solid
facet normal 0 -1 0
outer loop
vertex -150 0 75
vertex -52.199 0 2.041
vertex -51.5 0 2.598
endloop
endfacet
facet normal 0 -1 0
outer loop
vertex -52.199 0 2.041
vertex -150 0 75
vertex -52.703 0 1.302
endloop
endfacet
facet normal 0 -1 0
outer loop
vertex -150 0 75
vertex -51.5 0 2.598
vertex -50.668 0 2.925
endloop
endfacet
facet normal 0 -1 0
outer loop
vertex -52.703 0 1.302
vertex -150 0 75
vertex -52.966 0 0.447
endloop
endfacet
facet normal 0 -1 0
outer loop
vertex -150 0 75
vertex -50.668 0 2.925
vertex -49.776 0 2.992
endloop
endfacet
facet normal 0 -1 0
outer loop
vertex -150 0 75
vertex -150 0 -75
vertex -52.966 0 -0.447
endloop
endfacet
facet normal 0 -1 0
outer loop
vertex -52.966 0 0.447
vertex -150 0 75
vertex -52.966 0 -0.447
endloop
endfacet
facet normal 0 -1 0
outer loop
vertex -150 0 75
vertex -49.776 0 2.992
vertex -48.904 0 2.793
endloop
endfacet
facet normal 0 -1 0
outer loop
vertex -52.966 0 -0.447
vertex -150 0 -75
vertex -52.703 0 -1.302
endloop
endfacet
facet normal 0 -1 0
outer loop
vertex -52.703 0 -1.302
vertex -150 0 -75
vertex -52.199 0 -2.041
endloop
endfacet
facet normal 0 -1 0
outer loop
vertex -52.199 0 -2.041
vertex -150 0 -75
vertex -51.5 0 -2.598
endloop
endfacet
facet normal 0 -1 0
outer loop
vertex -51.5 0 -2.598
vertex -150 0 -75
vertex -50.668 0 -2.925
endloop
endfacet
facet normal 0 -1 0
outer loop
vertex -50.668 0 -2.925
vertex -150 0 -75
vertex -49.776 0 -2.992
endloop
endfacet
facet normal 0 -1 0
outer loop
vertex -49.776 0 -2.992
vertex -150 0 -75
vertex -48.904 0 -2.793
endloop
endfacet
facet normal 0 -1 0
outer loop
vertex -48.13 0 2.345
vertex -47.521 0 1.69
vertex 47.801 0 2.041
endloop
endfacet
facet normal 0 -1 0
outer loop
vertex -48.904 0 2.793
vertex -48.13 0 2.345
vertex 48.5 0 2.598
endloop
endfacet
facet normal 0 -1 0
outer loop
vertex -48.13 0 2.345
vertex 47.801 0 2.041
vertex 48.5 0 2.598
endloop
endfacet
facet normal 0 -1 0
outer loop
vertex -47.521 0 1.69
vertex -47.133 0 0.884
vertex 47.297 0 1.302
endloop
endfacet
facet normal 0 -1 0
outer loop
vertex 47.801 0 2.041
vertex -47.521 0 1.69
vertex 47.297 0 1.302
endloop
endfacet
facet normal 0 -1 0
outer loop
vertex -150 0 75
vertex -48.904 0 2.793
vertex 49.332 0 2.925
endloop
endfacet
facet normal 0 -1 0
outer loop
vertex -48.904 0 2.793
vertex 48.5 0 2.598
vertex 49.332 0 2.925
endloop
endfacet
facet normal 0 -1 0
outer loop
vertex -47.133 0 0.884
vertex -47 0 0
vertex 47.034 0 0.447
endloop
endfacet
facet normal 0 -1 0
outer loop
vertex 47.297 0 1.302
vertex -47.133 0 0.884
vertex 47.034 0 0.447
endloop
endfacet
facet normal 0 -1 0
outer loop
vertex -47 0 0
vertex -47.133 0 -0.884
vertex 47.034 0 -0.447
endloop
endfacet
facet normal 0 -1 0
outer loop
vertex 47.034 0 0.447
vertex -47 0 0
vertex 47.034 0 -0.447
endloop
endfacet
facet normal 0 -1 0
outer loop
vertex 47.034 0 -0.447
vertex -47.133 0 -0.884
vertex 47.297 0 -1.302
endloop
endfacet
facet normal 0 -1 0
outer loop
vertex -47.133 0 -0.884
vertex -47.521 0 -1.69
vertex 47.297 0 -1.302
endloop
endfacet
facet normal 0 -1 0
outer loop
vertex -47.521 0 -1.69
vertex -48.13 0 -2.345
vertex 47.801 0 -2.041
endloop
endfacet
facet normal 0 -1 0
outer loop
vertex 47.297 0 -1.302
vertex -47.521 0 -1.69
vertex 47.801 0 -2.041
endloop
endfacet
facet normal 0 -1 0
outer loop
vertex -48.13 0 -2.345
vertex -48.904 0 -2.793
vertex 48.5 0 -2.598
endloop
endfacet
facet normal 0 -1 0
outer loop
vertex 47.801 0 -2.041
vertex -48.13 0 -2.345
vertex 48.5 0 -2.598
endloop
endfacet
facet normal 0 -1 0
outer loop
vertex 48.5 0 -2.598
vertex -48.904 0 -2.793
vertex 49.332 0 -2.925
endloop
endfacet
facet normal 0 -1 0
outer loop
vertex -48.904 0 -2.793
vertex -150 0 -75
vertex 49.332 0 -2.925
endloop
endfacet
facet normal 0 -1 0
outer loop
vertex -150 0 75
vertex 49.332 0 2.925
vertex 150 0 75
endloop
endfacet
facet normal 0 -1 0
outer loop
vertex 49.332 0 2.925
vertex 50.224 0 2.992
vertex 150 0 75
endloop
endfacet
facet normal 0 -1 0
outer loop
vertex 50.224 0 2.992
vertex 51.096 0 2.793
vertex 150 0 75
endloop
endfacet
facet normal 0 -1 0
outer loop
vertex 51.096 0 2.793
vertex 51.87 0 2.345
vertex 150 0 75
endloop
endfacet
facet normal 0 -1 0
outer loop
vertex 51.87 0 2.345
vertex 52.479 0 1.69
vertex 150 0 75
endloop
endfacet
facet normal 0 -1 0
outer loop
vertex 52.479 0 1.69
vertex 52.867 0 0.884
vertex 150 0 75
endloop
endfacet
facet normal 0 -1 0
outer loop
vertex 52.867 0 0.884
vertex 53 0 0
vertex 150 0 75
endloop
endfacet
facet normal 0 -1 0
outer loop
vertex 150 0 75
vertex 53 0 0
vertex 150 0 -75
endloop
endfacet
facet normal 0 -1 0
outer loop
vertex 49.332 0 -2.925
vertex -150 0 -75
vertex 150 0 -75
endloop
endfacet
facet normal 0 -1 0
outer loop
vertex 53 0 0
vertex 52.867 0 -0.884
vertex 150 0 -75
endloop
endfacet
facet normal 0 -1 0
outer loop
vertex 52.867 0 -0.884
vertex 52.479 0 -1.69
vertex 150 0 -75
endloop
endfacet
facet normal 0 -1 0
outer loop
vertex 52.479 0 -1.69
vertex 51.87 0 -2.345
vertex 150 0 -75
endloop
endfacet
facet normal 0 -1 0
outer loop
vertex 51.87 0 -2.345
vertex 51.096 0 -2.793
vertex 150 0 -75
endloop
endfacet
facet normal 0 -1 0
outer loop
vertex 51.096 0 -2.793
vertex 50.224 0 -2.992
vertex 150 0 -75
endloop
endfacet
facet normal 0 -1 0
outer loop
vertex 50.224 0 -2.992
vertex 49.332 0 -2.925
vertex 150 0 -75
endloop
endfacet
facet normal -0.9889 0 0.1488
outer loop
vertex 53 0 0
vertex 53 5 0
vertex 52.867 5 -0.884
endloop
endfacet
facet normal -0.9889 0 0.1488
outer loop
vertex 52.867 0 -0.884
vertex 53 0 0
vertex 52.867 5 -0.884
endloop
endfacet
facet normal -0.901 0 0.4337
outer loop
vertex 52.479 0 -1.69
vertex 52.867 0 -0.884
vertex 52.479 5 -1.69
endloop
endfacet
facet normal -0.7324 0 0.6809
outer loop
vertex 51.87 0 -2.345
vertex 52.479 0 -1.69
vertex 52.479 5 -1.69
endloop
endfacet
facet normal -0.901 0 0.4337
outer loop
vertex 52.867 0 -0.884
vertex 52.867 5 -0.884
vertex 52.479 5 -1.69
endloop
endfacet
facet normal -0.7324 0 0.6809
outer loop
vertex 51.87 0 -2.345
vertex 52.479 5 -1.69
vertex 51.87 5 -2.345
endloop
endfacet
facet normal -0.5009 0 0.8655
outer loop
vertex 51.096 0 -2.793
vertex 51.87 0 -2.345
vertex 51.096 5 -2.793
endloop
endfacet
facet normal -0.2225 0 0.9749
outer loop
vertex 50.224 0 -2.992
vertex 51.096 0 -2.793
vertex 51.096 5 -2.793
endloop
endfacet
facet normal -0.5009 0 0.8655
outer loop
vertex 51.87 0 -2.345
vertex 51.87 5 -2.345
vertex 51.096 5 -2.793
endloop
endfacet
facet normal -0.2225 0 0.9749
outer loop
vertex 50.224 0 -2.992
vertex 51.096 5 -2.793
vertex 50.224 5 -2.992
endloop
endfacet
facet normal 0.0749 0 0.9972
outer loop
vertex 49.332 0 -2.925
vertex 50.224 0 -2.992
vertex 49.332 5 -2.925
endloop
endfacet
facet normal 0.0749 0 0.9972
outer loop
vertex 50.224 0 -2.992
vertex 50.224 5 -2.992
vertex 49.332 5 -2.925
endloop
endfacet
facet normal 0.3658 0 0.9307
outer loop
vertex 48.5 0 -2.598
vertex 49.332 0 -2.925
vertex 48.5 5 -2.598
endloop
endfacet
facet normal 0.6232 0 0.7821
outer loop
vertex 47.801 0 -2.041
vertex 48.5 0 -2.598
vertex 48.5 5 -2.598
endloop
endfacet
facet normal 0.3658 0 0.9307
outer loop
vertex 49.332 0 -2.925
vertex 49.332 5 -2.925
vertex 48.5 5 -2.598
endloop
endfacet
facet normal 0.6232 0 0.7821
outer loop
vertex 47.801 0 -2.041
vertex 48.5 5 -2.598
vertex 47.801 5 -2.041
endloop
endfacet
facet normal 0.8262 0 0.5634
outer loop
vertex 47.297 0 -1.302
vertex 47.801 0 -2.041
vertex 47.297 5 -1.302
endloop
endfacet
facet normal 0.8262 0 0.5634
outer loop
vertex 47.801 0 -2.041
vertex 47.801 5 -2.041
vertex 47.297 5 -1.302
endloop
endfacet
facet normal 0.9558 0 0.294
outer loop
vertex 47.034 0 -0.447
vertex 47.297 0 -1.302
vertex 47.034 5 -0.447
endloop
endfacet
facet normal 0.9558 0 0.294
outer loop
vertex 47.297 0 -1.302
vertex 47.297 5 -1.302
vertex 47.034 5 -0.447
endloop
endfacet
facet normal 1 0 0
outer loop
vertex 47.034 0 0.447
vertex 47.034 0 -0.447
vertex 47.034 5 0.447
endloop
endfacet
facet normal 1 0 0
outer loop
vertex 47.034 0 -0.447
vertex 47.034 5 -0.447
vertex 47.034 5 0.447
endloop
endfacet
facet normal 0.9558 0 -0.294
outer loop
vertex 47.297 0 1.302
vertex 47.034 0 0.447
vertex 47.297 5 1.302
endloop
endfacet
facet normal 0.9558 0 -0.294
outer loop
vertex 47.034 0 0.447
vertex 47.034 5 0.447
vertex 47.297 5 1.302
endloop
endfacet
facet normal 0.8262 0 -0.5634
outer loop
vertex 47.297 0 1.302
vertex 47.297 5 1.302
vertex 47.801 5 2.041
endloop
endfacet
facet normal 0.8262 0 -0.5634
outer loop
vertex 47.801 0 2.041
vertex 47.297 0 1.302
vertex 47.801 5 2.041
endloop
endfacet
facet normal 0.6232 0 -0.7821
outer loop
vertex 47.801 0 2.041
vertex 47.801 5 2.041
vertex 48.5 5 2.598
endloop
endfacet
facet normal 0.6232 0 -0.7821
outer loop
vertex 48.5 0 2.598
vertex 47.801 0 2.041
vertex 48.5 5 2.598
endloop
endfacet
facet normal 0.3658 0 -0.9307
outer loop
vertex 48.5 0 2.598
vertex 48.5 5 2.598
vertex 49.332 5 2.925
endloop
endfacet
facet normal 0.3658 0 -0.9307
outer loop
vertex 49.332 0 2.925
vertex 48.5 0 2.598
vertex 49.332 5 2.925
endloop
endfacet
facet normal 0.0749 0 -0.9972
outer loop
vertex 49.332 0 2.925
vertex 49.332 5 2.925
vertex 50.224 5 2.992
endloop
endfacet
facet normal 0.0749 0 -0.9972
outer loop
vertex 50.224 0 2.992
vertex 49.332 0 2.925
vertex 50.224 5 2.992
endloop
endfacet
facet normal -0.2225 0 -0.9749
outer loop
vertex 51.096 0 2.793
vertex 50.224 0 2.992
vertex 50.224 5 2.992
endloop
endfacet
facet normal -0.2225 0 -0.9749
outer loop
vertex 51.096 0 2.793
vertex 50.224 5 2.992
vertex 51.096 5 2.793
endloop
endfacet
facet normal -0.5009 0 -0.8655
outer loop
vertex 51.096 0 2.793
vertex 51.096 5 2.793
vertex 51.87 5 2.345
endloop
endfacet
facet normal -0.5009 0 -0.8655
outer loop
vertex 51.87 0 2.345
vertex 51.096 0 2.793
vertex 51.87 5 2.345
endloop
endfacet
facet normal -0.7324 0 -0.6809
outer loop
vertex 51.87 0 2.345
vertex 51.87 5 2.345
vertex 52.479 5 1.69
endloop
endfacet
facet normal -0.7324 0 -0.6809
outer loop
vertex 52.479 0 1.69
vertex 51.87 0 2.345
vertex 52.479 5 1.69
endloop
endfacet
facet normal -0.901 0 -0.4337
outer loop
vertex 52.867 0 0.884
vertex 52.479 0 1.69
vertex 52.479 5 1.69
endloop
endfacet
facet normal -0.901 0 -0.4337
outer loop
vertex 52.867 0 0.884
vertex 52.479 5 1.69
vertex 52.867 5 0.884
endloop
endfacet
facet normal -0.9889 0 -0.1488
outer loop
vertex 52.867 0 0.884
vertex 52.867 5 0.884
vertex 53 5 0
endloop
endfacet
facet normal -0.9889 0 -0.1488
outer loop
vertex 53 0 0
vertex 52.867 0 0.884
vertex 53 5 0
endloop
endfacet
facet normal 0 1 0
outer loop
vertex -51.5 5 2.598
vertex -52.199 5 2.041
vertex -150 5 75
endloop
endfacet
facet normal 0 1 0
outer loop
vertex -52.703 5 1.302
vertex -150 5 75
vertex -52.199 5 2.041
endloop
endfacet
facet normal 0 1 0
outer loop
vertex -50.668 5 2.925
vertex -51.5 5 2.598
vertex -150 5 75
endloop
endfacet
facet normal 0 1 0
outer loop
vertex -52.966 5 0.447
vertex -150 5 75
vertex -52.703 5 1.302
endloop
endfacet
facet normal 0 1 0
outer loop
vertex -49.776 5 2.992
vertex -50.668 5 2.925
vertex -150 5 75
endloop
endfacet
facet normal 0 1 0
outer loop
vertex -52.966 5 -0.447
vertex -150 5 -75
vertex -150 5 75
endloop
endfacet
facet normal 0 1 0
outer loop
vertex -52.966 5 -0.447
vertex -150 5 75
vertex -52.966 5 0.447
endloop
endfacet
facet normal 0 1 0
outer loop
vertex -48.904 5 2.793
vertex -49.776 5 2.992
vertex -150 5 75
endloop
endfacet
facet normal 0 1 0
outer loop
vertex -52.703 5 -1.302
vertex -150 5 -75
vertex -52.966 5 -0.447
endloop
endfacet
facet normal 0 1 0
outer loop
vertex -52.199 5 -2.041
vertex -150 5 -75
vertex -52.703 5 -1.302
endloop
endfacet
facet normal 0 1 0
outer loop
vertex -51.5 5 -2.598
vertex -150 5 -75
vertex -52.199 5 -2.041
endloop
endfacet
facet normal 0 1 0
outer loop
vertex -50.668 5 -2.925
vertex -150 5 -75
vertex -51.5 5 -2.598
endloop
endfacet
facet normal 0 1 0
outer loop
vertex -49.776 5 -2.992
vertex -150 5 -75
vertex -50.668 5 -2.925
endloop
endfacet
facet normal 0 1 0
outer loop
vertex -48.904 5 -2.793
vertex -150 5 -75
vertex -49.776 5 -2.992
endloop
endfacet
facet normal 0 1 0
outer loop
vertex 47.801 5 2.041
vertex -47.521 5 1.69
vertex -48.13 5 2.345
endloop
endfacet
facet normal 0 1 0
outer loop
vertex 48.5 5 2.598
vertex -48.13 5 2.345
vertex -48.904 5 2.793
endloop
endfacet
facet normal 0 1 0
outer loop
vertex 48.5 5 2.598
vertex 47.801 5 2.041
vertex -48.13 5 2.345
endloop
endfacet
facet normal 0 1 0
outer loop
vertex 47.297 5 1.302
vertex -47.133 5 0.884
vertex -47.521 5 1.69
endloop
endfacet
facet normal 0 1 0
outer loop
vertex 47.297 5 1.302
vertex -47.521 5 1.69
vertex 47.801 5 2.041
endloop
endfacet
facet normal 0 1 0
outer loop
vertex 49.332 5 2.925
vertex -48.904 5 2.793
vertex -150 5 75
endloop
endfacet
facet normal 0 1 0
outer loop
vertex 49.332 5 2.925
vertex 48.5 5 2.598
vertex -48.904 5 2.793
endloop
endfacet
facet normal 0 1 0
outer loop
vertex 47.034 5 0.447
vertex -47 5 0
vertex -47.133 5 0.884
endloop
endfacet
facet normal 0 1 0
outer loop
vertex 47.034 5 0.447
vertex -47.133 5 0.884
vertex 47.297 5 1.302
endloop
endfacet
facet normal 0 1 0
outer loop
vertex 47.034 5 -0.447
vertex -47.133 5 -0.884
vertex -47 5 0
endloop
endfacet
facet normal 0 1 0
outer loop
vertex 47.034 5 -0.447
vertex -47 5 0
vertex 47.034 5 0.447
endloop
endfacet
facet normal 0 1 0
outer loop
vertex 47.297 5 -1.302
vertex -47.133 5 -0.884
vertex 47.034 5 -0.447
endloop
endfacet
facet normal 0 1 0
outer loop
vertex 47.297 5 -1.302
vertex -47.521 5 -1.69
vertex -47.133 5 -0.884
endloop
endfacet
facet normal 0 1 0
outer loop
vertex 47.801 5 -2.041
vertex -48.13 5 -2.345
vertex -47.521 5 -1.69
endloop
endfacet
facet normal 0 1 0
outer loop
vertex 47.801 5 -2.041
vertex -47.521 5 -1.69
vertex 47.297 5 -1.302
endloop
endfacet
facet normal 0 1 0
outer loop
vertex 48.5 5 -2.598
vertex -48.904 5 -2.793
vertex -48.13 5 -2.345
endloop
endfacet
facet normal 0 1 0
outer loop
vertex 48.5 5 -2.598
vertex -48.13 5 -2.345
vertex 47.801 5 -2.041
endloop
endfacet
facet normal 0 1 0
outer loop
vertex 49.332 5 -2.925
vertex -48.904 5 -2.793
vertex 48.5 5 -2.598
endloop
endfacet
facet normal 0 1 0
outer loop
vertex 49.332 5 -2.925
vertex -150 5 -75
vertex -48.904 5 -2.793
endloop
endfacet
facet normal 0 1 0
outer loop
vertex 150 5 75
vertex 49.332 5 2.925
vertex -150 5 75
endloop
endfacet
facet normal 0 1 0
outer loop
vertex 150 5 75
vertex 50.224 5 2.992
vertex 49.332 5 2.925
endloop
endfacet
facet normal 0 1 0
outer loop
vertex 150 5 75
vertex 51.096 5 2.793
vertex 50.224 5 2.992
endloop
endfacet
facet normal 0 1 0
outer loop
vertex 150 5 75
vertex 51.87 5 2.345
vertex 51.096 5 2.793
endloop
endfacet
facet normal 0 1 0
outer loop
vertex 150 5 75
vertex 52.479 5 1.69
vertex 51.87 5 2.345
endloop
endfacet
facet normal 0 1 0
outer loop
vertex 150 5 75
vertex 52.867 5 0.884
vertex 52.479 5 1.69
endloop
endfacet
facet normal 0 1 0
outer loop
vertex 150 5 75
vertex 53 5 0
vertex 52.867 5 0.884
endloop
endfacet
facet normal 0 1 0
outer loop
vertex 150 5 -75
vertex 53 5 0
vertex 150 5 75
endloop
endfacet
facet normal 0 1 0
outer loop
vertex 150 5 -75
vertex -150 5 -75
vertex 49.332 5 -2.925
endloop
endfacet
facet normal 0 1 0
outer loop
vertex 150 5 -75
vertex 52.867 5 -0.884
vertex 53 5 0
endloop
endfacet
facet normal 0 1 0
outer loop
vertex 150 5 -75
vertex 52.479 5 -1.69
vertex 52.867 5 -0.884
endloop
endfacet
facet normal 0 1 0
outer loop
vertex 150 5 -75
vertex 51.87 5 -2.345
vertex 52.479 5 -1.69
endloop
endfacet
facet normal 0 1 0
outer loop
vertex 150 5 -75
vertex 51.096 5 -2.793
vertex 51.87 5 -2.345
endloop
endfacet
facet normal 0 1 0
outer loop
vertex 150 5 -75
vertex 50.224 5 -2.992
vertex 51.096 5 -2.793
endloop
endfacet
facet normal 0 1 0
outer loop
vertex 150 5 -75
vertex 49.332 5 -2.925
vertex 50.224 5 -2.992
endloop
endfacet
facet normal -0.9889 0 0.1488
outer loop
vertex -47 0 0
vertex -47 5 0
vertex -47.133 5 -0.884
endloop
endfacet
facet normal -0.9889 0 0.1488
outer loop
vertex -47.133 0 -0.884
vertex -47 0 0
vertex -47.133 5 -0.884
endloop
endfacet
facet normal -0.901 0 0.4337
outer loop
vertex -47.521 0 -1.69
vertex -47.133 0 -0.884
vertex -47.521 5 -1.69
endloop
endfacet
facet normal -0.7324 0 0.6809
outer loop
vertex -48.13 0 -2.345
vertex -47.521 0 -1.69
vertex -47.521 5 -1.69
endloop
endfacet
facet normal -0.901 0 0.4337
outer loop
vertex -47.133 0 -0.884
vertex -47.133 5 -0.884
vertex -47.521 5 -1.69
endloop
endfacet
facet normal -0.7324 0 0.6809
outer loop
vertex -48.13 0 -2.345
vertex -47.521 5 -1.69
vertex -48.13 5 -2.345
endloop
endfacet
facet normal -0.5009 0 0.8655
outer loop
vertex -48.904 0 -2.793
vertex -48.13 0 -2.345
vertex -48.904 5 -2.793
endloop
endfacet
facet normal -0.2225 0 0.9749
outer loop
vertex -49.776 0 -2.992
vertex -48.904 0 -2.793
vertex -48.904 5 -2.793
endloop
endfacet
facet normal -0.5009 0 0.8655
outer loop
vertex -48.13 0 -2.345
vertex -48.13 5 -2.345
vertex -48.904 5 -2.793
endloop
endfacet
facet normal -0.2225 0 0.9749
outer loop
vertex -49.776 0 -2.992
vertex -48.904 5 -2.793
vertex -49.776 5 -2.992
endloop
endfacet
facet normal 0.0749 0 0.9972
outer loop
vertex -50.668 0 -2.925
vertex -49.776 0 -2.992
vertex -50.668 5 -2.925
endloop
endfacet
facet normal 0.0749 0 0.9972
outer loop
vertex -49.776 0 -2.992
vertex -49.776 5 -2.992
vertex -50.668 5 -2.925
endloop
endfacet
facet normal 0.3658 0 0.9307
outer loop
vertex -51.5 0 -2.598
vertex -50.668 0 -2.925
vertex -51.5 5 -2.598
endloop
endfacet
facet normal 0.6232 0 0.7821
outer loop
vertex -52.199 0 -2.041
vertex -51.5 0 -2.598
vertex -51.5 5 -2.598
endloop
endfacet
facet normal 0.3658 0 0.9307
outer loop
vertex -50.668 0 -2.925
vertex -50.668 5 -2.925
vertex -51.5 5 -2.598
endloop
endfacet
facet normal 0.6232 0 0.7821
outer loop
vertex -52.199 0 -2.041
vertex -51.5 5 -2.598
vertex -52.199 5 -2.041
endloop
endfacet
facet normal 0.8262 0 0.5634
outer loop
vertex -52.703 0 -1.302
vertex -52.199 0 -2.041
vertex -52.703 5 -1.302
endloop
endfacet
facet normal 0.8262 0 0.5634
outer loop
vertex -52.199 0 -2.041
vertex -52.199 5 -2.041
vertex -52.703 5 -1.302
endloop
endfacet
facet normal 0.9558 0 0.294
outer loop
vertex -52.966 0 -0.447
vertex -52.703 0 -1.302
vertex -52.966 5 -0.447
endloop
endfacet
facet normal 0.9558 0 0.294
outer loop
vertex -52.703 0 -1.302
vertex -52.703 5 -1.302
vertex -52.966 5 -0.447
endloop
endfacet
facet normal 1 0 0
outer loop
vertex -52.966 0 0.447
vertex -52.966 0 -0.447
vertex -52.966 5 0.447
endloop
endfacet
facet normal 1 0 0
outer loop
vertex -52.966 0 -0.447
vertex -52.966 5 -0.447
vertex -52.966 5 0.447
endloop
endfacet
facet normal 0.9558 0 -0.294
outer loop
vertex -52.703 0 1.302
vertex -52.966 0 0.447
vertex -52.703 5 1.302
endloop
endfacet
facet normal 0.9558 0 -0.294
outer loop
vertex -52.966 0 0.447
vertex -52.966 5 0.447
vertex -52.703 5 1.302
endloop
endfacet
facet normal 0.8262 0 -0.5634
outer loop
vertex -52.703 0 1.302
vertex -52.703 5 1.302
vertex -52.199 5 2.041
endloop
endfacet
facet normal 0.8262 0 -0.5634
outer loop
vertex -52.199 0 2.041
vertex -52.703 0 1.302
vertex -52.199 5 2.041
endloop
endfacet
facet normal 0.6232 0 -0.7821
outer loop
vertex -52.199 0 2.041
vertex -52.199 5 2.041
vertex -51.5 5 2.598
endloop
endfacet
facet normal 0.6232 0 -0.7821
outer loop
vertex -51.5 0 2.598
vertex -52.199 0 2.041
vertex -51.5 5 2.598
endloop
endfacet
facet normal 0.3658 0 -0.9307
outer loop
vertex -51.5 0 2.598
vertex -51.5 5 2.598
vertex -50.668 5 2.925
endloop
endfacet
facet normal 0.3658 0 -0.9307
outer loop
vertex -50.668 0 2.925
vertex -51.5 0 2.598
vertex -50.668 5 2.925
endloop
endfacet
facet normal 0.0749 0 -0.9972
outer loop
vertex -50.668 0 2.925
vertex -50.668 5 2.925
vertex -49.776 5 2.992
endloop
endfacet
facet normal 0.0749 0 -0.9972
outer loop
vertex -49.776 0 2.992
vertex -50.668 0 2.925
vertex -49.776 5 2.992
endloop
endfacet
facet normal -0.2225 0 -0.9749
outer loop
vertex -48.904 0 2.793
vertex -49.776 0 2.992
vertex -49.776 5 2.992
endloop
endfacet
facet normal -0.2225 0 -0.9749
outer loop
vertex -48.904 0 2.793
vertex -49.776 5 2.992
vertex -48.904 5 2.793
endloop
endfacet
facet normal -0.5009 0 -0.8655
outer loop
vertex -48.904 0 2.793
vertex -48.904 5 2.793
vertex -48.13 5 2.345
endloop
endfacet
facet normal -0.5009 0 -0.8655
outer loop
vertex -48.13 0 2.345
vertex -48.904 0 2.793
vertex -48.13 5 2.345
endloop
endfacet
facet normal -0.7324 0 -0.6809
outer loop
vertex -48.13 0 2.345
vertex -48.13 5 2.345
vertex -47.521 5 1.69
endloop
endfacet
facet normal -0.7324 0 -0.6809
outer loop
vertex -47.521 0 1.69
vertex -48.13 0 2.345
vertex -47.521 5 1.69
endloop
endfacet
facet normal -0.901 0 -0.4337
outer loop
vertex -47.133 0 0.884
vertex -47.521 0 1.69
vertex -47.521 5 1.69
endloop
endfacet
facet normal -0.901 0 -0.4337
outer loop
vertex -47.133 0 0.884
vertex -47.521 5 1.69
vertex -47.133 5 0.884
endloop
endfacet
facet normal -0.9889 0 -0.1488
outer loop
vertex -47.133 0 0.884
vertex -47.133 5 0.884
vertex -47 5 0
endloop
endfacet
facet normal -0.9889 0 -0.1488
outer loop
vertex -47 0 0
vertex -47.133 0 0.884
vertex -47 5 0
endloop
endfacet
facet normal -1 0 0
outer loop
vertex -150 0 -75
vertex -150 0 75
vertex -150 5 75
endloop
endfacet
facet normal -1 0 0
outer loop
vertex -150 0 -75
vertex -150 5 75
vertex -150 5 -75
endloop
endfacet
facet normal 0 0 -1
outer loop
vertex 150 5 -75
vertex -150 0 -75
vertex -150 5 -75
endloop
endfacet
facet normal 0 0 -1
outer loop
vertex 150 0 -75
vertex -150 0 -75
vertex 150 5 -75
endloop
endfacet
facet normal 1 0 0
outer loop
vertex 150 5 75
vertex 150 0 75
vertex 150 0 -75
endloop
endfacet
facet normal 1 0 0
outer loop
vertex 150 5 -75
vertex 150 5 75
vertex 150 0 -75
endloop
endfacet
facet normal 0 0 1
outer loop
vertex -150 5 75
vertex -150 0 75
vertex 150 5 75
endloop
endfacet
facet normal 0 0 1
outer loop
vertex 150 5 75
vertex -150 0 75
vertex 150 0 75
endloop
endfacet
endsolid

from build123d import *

# Parameters (mm, degrees)
SKETCH1_W           = 300
SKETCH1_H           = 150
BOSS_EXTRUDE1_DEPTH = 5
CUT_EXTRUDE1_REACH  = 7
SKETCH2_R           = 3


with BuildPart() as part:
    # Sketch1 → Boss-Extrude1 (new body)
    with BuildSketch(Plane(origin=(0, 0, 0), x_dir=(1, 0, 0), z_dir=(0, 1, 0))):
        Rectangle(SKETCH1_W, SKETCH1_H)
    extrude(amount=BOSS_EXTRUDE1_DEPTH)

    # Sketch2 → Cut-Extrude1 (cut, up to next)
    with BuildSketch(Plane(origin=(0, 5, 0), x_dir=(1, 0, 0), z_dir=(0, 1, 0)), mode=Mode.PRIVATE) as cut_extrude1_sk1:
        with Locations((-50, 0)):
            Circle(SKETCH2_R)
    cut_extrude1_tool1 = extrude(cut_extrude1_sk1.sketch, amount=-CUT_EXTRUDE1_REACH, mode=Mode.PRIVATE) & part.part
    add(cut_extrude1_tool1.solids().sort_by_distance((-50, 5, 0))[0], mode=Mode.SUBTRACT)
    # Sketch2 → Cut-Extrude1 (cut, up to next)
    with BuildSketch(Plane(origin=(0, 5, 0), x_dir=(1, 0, 0), z_dir=(0, 1, 0)), mode=Mode.PRIVATE) as cut_extrude1_sk2:
        with Locations((50, 0)):
            Circle(SKETCH2_R)
    cut_extrude1_tool2 = extrude(cut_extrude1_sk2.sketch, amount=-CUT_EXTRUDE1_REACH, mode=Mode.PRIVATE) & part.part
    add(cut_extrude1_tool2.solids().sort_by_distance((50, 5, 0))[0], mode=Mode.SUBTRACT)


solid = part.part
